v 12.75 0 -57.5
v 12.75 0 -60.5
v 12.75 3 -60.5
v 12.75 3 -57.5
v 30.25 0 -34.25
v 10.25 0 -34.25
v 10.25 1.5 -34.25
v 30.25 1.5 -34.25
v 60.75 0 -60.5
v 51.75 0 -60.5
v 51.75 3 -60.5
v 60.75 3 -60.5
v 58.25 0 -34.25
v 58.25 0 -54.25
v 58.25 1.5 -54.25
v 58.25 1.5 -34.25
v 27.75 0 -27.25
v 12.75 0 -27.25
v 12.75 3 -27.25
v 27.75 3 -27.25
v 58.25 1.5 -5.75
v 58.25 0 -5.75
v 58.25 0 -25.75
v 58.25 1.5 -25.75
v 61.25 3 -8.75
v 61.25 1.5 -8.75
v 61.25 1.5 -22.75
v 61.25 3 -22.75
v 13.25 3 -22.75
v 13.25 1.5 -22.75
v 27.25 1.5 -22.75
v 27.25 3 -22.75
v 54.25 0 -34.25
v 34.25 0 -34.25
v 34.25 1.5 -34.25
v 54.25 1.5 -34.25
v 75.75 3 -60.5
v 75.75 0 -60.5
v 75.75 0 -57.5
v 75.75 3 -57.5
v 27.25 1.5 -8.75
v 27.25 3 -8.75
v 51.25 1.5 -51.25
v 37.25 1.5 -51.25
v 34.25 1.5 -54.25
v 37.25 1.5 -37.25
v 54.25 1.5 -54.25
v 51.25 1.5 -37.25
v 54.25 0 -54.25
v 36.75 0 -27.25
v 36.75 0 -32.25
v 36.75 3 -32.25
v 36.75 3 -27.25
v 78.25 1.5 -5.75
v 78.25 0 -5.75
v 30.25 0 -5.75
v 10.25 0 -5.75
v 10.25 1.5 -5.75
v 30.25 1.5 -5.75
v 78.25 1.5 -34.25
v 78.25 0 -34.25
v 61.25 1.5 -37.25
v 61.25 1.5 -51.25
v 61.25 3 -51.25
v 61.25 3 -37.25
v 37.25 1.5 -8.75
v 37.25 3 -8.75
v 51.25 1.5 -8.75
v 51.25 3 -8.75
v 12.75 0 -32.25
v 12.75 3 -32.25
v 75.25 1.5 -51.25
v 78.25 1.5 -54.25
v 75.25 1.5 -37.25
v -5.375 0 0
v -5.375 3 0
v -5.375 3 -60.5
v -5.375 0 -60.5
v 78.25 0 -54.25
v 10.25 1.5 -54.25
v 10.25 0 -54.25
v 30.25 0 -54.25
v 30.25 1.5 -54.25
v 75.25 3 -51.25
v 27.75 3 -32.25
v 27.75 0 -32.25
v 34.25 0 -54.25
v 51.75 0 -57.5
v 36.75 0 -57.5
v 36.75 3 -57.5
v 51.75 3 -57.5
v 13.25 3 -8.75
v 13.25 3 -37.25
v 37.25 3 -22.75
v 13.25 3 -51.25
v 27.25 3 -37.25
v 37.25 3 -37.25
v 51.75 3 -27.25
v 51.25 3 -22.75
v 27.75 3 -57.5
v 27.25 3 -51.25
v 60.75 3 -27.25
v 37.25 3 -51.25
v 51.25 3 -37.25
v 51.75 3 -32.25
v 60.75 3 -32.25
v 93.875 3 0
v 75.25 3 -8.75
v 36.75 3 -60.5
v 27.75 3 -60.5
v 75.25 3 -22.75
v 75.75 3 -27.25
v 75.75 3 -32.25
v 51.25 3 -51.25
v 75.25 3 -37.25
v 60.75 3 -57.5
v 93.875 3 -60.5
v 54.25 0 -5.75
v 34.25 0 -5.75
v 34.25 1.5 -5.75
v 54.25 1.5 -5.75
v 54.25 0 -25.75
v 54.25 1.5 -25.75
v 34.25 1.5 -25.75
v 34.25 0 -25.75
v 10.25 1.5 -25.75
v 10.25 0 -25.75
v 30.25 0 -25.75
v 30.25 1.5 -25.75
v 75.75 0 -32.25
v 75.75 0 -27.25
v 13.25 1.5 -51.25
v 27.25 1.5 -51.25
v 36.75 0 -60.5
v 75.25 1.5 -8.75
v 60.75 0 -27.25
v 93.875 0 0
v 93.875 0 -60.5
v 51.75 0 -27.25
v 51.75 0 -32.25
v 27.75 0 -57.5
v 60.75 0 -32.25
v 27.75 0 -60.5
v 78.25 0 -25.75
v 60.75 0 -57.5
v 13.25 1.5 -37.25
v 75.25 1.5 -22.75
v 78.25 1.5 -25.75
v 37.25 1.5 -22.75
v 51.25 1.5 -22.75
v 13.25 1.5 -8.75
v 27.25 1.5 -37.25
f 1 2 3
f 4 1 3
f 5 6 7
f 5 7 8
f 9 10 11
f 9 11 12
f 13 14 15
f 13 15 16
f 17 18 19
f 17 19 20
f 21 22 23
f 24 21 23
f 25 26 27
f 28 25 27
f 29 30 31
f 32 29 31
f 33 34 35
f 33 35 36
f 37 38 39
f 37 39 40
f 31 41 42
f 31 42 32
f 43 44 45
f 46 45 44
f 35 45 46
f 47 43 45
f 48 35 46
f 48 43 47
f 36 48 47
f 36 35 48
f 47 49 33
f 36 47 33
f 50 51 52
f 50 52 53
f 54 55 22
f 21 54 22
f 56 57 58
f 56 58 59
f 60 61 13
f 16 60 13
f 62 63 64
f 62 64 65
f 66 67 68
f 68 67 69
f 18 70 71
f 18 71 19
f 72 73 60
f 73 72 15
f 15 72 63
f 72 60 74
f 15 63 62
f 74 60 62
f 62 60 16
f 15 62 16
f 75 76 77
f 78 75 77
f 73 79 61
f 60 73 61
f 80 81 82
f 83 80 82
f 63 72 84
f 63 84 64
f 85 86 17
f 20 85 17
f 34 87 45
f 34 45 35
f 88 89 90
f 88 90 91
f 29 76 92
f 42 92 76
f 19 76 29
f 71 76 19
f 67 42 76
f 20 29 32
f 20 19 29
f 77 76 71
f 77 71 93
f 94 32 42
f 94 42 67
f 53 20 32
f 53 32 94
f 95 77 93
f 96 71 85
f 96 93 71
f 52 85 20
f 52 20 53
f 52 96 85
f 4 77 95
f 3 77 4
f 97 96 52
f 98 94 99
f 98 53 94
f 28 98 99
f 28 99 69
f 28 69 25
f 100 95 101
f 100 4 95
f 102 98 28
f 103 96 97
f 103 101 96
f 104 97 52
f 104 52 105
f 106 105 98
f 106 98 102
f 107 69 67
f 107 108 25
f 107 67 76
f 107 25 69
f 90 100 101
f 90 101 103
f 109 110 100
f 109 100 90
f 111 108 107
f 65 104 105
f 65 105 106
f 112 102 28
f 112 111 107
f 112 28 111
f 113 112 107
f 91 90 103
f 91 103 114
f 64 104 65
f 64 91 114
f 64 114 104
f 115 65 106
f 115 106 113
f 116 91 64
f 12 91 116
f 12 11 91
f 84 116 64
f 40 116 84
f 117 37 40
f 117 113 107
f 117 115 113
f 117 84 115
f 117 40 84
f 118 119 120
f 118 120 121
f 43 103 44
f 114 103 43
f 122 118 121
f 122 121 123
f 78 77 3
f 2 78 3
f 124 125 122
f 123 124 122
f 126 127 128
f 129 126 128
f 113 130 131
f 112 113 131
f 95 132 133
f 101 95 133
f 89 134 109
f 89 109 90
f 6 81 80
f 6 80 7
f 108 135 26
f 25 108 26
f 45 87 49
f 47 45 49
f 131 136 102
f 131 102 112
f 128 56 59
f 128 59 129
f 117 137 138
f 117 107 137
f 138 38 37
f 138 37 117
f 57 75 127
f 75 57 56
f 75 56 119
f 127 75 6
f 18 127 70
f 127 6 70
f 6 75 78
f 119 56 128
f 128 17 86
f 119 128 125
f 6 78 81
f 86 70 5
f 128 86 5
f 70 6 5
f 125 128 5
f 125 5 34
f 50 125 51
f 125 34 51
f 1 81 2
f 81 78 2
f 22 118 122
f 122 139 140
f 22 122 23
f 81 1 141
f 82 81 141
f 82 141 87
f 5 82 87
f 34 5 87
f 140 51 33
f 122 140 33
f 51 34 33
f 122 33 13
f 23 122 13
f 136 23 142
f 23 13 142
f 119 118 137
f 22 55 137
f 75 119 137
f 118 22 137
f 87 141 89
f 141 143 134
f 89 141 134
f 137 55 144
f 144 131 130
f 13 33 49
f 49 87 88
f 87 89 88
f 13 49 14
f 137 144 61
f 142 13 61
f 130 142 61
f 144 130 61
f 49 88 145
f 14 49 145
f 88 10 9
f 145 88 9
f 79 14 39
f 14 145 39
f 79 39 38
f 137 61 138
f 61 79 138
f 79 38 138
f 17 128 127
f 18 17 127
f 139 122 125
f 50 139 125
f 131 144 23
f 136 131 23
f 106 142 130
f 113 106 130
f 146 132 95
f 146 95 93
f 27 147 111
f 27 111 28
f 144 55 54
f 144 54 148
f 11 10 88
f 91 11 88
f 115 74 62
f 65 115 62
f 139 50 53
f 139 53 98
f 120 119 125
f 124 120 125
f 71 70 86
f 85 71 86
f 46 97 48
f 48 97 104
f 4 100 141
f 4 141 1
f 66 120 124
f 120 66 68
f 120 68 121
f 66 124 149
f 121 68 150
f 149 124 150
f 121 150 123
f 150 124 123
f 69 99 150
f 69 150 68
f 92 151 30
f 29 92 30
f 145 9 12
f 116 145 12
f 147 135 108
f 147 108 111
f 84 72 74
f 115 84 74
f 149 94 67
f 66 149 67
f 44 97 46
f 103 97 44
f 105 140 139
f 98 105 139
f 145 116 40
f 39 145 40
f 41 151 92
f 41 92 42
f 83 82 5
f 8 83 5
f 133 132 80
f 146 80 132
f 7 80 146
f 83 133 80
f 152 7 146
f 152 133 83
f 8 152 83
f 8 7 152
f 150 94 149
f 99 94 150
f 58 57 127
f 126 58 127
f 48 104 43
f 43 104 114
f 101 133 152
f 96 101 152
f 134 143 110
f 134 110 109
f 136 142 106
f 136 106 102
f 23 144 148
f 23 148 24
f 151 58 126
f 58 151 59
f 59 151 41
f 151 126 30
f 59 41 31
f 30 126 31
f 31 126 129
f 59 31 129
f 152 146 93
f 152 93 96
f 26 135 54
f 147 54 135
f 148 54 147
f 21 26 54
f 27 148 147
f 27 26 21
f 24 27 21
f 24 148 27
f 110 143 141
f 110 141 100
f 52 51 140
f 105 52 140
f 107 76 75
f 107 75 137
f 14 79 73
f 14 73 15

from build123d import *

# Parameters (mm, degrees)
SKETCH1_W               = 88.5
SKETCH1_H               = 60.5
BOSS_EXTRUDE1_DEPTH     = 3
SKETCH2_W               = 55.9
SKETCH2_H               = 3
BOSS_EXTRUDE2_DEPTH     = 5.375
SKETCH3_W               = 14
SKETCH3_H               = 14
CUT_EXTRUDE4_DEPTH      = 112.72182251
SKETCH7_W               = 20
SKETCH7_H               = 20
CUT_EXTRUDE5_DEPTH      = 1.5
SKETCH9_W               = 15
SKETCH9_H               = 3
CUT_EXTRUDE6_DEPTH      = 3
SKETCH10_W              = 14
SKETCH10_H              = 14
CUT_EXTRUDE7_DEPTH      = 10
SKETCH11_W              = 20
SKETCH11_H              = 20
CUT_EXTRUDE8_DEPTH      = 1.5
SKETCH12_W              = 15
SKETCH12_H              = 3
CUT_EXTRUDE9_DEPTH      = 40
MIRROR8_COPY_1_SKETCH_W = 14
MIRROR8_COPY_1_SKETCH_H = 14
MIRROR8_COPY_1_DEPTH    = 112.72182251
MIRROR8_COPY_2_SKETCH_W = 20
MIRROR8_COPY_2_SKETCH_H = 20
MIRROR8_COPY_2_DEPTH    = 1.5
SKETCH13_W              = 5.375
SKETCH13_H              = 2.3
BOSS_EXTRUDE3_DEPTH     = 3
SKETCH15_W              = 15
SKETCH15_H              = 5
CUT_EXTRUDE11_DEPTH     = 112.72182251


with BuildPart() as part:
    # Sketch1 → Boss-Extrude1 (new body)
    with BuildSketch(Plane(origin=(0, 0, 0), x_dir=(1, 0, 0), z_dir=(0, 1, 0))):
        with Locations((44.25, 30.25)):
            Rectangle(SKETCH1_W, SKETCH1_H)
    extrude(amount=BOSS_EXTRUDE1_DEPTH)

    # Sketch2 → Boss-Extrude2 (add)
    with BuildSketch(Plane(origin=(88.5, 0, 0), x_dir=(0, 0, -1), z_dir=(1, 0, 0))):
        with Locations((30.25, 1.5)):
            Rectangle(SKETCH2_W, SKETCH2_H)
    boss_extrude2 = extrude(amount=BOSS_EXTRUDE2_DEPTH)

    # Mirror2: Boss-Extrude2 across plane
    add(boss_extrude2.mirror(Plane(origin=(44.25, 0, 0), x_dir=(0, 0, 1), z_dir=(1, 0, 0))))

    # Sketch3 → Cut-Extrude4 (cut, through all)
    with BuildSketch(Plane.XZ):
        with Locations((20.25, -44.25)):
            Rectangle(SKETCH3_W, SKETCH3_H)
    cut_extrude4 = extrude(amount=-CUT_EXTRUDE4_DEPTH, mode=Mode.SUBTRACT)

    # Sketch7 → Cut-Extrude5 (cut)
    with BuildSketch(Plane.XZ):
        with Locations((20.25, -44.25)):
            Rectangle(SKETCH7_W, SKETCH7_H)
    cut_extrude5 = extrude(amount=-CUT_EXTRUDE5_DEPTH, mode=Mode.SUBTRACT)

    # Mirror4: Cut-Extrude4, Cut-Extrude5 across plane
    add(cut_extrude4.mirror(Plane(origin=(44.25, 0, 0), x_dir=(0, 0, 1), z_dir=(1, 0, 0))), mode=Mode.SUBTRACT)
    add(cut_extrude5.mirror(Plane(origin=(44.25, 0, 0), x_dir=(0, 0, 1), z_dir=(1, 0, 0))), mode=Mode.SUBTRACT)

    # Sketch9 → Cut-Extrude6 (cut)
    with BuildSketch(Plane(origin=(0, 0, -60.5), x_dir=(-1, 0, 0), z_dir=(0, 0, -1))):
        with Locations((-20.25, 1.5)):
            Rectangle(SKETCH9_W, SKETCH9_H)
    cut_extrude6 = extrude(amount=-CUT_EXTRUDE6_DEPTH, mode=Mode.SUBTRACT)

    # Mirror6: Cut-Extrude6 across plane
    add(cut_extrude6.mirror(Plane(origin=(44.25, 0, 0), x_dir=(0, 0, 1), z_dir=(1, 0, 0))), mode=Mode.SUBTRACT)

    # Sketch10 → Cut-Extrude7 (cut)
    with BuildSketch(Plane(origin=(0, 3, 0), x_dir=(1, 0, 0), z_dir=(0, 1, 0))):
        with Locations((44.25, 44.25)):
            Rectangle(SKETCH10_W, SKETCH10_H)
    cut_extrude7 = extrude(amount=-CUT_EXTRUDE7_DEPTH, mode=Mode.SUBTRACT)

    # Sketch11 → Cut-Extrude8 (cut)
    with BuildSketch(Plane.XZ):
        with Locations((44.25, -44.25)):
            Rectangle(SKETCH11_W, SKETCH11_H)
    cut_extrude8 = extrude(amount=-CUT_EXTRUDE8_DEPTH, mode=Mode.SUBTRACT)

    # Sketch12 → Cut-Extrude9 (cut)
    with BuildSketch(Plane.XZ):
        with Locations((44.25, -59)):
            Rectangle(SKETCH12_W, SKETCH12_H)
    extrude(amount=-CUT_EXTRUDE9_DEPTH, mode=Mode.SUBTRACT)

    # Mirror8: Cut-Extrude4, Cut-Extrude5, Cut-Extrude7, Cut-Extrude8 across plane
    add(cut_extrude4.mirror(Plane.XY.offset(-30)), mode=Mode.SUBTRACT)
    add(cut_extrude5.mirror(Plane.XY.offset(-30)), mode=Mode.SUBTRACT)
    add(cut_extrude7.mirror(Plane.XY.offset(-30)), mode=Mode.SUBTRACT)
    add(cut_extrude8.mirror(Plane.XY.offset(-30)), mode=Mode.SUBTRACT)

    # Mirror8 copy 1 sketch → Mirror8 copy 1 (cut, through all)
    with BuildSketch(Plane(origin=(88.5, 0, -60), x_dir=(-1, 0, 0), z_dir=(0, -1, 0))):
        with Locations((20.25, -44.25)):
            Rectangle(MIRROR8_COPY_1_SKETCH_W, MIRROR8_COPY_1_SKETCH_H)
    extrude(amount=-MIRROR8_COPY_1_DEPTH, mode=Mode.SUBTRACT)

    # Mirror8 copy 2 sketch → Mirror8 copy 2 (cut)
    with BuildSketch(Plane(origin=(88.5, 0, -60), x_dir=(-1, 0, 0), z_dir=(0, -1, 0))):
        with Locations((20.25, -44.25)):
            Rectangle(MIRROR8_COPY_2_SKETCH_W, MIRROR8_COPY_2_SKETCH_H)
    extrude(amount=-MIRROR8_COPY_2_DEPTH, mode=Mode.SUBTRACT)

    # Sketch13 → Boss-Extrude3 (add)
    with BuildSketch(Plane(origin=(0, 3, 0), x_dir=(1, 0, 0), z_dir=(0, 1, 0))):
        with Locations((-2.6875, 59.35)):
            Rectangle(SKETCH13_W, SKETCH13_H)
        with Locations((-2.6875, 1.15)):
            Rectangle(SKETCH13_W, SKETCH13_H)
        with Locations((91.1875, 1.15)):
            Rectangle(SKETCH13_W, SKETCH13_H)
        with Locations((91.1875, 59.35)):
            Rectangle(SKETCH13_W, SKETCH13_H)
    extrude(amount=-BOSS_EXTRUDE3_DEPTH)

    # Sketch15 → Cut-Extrude11 (cut, through all)
    with BuildSketch(Plane.XZ):
        with Locations((20.25, -29.75)):
            Rectangle(SKETCH15_W, SKETCH15_H)
        with Locations((44.25, -29.75)):
            Rectangle(SKETCH15_W, SKETCH15_H)
        with Locations((68.25, -29.75)):
            Rectangle(SKETCH15_W, SKETCH15_H)
    extrude(amount=-CUT_EXTRUDE11_DEPTH, mode=Mode.SUBTRACT)


solid = part.part
